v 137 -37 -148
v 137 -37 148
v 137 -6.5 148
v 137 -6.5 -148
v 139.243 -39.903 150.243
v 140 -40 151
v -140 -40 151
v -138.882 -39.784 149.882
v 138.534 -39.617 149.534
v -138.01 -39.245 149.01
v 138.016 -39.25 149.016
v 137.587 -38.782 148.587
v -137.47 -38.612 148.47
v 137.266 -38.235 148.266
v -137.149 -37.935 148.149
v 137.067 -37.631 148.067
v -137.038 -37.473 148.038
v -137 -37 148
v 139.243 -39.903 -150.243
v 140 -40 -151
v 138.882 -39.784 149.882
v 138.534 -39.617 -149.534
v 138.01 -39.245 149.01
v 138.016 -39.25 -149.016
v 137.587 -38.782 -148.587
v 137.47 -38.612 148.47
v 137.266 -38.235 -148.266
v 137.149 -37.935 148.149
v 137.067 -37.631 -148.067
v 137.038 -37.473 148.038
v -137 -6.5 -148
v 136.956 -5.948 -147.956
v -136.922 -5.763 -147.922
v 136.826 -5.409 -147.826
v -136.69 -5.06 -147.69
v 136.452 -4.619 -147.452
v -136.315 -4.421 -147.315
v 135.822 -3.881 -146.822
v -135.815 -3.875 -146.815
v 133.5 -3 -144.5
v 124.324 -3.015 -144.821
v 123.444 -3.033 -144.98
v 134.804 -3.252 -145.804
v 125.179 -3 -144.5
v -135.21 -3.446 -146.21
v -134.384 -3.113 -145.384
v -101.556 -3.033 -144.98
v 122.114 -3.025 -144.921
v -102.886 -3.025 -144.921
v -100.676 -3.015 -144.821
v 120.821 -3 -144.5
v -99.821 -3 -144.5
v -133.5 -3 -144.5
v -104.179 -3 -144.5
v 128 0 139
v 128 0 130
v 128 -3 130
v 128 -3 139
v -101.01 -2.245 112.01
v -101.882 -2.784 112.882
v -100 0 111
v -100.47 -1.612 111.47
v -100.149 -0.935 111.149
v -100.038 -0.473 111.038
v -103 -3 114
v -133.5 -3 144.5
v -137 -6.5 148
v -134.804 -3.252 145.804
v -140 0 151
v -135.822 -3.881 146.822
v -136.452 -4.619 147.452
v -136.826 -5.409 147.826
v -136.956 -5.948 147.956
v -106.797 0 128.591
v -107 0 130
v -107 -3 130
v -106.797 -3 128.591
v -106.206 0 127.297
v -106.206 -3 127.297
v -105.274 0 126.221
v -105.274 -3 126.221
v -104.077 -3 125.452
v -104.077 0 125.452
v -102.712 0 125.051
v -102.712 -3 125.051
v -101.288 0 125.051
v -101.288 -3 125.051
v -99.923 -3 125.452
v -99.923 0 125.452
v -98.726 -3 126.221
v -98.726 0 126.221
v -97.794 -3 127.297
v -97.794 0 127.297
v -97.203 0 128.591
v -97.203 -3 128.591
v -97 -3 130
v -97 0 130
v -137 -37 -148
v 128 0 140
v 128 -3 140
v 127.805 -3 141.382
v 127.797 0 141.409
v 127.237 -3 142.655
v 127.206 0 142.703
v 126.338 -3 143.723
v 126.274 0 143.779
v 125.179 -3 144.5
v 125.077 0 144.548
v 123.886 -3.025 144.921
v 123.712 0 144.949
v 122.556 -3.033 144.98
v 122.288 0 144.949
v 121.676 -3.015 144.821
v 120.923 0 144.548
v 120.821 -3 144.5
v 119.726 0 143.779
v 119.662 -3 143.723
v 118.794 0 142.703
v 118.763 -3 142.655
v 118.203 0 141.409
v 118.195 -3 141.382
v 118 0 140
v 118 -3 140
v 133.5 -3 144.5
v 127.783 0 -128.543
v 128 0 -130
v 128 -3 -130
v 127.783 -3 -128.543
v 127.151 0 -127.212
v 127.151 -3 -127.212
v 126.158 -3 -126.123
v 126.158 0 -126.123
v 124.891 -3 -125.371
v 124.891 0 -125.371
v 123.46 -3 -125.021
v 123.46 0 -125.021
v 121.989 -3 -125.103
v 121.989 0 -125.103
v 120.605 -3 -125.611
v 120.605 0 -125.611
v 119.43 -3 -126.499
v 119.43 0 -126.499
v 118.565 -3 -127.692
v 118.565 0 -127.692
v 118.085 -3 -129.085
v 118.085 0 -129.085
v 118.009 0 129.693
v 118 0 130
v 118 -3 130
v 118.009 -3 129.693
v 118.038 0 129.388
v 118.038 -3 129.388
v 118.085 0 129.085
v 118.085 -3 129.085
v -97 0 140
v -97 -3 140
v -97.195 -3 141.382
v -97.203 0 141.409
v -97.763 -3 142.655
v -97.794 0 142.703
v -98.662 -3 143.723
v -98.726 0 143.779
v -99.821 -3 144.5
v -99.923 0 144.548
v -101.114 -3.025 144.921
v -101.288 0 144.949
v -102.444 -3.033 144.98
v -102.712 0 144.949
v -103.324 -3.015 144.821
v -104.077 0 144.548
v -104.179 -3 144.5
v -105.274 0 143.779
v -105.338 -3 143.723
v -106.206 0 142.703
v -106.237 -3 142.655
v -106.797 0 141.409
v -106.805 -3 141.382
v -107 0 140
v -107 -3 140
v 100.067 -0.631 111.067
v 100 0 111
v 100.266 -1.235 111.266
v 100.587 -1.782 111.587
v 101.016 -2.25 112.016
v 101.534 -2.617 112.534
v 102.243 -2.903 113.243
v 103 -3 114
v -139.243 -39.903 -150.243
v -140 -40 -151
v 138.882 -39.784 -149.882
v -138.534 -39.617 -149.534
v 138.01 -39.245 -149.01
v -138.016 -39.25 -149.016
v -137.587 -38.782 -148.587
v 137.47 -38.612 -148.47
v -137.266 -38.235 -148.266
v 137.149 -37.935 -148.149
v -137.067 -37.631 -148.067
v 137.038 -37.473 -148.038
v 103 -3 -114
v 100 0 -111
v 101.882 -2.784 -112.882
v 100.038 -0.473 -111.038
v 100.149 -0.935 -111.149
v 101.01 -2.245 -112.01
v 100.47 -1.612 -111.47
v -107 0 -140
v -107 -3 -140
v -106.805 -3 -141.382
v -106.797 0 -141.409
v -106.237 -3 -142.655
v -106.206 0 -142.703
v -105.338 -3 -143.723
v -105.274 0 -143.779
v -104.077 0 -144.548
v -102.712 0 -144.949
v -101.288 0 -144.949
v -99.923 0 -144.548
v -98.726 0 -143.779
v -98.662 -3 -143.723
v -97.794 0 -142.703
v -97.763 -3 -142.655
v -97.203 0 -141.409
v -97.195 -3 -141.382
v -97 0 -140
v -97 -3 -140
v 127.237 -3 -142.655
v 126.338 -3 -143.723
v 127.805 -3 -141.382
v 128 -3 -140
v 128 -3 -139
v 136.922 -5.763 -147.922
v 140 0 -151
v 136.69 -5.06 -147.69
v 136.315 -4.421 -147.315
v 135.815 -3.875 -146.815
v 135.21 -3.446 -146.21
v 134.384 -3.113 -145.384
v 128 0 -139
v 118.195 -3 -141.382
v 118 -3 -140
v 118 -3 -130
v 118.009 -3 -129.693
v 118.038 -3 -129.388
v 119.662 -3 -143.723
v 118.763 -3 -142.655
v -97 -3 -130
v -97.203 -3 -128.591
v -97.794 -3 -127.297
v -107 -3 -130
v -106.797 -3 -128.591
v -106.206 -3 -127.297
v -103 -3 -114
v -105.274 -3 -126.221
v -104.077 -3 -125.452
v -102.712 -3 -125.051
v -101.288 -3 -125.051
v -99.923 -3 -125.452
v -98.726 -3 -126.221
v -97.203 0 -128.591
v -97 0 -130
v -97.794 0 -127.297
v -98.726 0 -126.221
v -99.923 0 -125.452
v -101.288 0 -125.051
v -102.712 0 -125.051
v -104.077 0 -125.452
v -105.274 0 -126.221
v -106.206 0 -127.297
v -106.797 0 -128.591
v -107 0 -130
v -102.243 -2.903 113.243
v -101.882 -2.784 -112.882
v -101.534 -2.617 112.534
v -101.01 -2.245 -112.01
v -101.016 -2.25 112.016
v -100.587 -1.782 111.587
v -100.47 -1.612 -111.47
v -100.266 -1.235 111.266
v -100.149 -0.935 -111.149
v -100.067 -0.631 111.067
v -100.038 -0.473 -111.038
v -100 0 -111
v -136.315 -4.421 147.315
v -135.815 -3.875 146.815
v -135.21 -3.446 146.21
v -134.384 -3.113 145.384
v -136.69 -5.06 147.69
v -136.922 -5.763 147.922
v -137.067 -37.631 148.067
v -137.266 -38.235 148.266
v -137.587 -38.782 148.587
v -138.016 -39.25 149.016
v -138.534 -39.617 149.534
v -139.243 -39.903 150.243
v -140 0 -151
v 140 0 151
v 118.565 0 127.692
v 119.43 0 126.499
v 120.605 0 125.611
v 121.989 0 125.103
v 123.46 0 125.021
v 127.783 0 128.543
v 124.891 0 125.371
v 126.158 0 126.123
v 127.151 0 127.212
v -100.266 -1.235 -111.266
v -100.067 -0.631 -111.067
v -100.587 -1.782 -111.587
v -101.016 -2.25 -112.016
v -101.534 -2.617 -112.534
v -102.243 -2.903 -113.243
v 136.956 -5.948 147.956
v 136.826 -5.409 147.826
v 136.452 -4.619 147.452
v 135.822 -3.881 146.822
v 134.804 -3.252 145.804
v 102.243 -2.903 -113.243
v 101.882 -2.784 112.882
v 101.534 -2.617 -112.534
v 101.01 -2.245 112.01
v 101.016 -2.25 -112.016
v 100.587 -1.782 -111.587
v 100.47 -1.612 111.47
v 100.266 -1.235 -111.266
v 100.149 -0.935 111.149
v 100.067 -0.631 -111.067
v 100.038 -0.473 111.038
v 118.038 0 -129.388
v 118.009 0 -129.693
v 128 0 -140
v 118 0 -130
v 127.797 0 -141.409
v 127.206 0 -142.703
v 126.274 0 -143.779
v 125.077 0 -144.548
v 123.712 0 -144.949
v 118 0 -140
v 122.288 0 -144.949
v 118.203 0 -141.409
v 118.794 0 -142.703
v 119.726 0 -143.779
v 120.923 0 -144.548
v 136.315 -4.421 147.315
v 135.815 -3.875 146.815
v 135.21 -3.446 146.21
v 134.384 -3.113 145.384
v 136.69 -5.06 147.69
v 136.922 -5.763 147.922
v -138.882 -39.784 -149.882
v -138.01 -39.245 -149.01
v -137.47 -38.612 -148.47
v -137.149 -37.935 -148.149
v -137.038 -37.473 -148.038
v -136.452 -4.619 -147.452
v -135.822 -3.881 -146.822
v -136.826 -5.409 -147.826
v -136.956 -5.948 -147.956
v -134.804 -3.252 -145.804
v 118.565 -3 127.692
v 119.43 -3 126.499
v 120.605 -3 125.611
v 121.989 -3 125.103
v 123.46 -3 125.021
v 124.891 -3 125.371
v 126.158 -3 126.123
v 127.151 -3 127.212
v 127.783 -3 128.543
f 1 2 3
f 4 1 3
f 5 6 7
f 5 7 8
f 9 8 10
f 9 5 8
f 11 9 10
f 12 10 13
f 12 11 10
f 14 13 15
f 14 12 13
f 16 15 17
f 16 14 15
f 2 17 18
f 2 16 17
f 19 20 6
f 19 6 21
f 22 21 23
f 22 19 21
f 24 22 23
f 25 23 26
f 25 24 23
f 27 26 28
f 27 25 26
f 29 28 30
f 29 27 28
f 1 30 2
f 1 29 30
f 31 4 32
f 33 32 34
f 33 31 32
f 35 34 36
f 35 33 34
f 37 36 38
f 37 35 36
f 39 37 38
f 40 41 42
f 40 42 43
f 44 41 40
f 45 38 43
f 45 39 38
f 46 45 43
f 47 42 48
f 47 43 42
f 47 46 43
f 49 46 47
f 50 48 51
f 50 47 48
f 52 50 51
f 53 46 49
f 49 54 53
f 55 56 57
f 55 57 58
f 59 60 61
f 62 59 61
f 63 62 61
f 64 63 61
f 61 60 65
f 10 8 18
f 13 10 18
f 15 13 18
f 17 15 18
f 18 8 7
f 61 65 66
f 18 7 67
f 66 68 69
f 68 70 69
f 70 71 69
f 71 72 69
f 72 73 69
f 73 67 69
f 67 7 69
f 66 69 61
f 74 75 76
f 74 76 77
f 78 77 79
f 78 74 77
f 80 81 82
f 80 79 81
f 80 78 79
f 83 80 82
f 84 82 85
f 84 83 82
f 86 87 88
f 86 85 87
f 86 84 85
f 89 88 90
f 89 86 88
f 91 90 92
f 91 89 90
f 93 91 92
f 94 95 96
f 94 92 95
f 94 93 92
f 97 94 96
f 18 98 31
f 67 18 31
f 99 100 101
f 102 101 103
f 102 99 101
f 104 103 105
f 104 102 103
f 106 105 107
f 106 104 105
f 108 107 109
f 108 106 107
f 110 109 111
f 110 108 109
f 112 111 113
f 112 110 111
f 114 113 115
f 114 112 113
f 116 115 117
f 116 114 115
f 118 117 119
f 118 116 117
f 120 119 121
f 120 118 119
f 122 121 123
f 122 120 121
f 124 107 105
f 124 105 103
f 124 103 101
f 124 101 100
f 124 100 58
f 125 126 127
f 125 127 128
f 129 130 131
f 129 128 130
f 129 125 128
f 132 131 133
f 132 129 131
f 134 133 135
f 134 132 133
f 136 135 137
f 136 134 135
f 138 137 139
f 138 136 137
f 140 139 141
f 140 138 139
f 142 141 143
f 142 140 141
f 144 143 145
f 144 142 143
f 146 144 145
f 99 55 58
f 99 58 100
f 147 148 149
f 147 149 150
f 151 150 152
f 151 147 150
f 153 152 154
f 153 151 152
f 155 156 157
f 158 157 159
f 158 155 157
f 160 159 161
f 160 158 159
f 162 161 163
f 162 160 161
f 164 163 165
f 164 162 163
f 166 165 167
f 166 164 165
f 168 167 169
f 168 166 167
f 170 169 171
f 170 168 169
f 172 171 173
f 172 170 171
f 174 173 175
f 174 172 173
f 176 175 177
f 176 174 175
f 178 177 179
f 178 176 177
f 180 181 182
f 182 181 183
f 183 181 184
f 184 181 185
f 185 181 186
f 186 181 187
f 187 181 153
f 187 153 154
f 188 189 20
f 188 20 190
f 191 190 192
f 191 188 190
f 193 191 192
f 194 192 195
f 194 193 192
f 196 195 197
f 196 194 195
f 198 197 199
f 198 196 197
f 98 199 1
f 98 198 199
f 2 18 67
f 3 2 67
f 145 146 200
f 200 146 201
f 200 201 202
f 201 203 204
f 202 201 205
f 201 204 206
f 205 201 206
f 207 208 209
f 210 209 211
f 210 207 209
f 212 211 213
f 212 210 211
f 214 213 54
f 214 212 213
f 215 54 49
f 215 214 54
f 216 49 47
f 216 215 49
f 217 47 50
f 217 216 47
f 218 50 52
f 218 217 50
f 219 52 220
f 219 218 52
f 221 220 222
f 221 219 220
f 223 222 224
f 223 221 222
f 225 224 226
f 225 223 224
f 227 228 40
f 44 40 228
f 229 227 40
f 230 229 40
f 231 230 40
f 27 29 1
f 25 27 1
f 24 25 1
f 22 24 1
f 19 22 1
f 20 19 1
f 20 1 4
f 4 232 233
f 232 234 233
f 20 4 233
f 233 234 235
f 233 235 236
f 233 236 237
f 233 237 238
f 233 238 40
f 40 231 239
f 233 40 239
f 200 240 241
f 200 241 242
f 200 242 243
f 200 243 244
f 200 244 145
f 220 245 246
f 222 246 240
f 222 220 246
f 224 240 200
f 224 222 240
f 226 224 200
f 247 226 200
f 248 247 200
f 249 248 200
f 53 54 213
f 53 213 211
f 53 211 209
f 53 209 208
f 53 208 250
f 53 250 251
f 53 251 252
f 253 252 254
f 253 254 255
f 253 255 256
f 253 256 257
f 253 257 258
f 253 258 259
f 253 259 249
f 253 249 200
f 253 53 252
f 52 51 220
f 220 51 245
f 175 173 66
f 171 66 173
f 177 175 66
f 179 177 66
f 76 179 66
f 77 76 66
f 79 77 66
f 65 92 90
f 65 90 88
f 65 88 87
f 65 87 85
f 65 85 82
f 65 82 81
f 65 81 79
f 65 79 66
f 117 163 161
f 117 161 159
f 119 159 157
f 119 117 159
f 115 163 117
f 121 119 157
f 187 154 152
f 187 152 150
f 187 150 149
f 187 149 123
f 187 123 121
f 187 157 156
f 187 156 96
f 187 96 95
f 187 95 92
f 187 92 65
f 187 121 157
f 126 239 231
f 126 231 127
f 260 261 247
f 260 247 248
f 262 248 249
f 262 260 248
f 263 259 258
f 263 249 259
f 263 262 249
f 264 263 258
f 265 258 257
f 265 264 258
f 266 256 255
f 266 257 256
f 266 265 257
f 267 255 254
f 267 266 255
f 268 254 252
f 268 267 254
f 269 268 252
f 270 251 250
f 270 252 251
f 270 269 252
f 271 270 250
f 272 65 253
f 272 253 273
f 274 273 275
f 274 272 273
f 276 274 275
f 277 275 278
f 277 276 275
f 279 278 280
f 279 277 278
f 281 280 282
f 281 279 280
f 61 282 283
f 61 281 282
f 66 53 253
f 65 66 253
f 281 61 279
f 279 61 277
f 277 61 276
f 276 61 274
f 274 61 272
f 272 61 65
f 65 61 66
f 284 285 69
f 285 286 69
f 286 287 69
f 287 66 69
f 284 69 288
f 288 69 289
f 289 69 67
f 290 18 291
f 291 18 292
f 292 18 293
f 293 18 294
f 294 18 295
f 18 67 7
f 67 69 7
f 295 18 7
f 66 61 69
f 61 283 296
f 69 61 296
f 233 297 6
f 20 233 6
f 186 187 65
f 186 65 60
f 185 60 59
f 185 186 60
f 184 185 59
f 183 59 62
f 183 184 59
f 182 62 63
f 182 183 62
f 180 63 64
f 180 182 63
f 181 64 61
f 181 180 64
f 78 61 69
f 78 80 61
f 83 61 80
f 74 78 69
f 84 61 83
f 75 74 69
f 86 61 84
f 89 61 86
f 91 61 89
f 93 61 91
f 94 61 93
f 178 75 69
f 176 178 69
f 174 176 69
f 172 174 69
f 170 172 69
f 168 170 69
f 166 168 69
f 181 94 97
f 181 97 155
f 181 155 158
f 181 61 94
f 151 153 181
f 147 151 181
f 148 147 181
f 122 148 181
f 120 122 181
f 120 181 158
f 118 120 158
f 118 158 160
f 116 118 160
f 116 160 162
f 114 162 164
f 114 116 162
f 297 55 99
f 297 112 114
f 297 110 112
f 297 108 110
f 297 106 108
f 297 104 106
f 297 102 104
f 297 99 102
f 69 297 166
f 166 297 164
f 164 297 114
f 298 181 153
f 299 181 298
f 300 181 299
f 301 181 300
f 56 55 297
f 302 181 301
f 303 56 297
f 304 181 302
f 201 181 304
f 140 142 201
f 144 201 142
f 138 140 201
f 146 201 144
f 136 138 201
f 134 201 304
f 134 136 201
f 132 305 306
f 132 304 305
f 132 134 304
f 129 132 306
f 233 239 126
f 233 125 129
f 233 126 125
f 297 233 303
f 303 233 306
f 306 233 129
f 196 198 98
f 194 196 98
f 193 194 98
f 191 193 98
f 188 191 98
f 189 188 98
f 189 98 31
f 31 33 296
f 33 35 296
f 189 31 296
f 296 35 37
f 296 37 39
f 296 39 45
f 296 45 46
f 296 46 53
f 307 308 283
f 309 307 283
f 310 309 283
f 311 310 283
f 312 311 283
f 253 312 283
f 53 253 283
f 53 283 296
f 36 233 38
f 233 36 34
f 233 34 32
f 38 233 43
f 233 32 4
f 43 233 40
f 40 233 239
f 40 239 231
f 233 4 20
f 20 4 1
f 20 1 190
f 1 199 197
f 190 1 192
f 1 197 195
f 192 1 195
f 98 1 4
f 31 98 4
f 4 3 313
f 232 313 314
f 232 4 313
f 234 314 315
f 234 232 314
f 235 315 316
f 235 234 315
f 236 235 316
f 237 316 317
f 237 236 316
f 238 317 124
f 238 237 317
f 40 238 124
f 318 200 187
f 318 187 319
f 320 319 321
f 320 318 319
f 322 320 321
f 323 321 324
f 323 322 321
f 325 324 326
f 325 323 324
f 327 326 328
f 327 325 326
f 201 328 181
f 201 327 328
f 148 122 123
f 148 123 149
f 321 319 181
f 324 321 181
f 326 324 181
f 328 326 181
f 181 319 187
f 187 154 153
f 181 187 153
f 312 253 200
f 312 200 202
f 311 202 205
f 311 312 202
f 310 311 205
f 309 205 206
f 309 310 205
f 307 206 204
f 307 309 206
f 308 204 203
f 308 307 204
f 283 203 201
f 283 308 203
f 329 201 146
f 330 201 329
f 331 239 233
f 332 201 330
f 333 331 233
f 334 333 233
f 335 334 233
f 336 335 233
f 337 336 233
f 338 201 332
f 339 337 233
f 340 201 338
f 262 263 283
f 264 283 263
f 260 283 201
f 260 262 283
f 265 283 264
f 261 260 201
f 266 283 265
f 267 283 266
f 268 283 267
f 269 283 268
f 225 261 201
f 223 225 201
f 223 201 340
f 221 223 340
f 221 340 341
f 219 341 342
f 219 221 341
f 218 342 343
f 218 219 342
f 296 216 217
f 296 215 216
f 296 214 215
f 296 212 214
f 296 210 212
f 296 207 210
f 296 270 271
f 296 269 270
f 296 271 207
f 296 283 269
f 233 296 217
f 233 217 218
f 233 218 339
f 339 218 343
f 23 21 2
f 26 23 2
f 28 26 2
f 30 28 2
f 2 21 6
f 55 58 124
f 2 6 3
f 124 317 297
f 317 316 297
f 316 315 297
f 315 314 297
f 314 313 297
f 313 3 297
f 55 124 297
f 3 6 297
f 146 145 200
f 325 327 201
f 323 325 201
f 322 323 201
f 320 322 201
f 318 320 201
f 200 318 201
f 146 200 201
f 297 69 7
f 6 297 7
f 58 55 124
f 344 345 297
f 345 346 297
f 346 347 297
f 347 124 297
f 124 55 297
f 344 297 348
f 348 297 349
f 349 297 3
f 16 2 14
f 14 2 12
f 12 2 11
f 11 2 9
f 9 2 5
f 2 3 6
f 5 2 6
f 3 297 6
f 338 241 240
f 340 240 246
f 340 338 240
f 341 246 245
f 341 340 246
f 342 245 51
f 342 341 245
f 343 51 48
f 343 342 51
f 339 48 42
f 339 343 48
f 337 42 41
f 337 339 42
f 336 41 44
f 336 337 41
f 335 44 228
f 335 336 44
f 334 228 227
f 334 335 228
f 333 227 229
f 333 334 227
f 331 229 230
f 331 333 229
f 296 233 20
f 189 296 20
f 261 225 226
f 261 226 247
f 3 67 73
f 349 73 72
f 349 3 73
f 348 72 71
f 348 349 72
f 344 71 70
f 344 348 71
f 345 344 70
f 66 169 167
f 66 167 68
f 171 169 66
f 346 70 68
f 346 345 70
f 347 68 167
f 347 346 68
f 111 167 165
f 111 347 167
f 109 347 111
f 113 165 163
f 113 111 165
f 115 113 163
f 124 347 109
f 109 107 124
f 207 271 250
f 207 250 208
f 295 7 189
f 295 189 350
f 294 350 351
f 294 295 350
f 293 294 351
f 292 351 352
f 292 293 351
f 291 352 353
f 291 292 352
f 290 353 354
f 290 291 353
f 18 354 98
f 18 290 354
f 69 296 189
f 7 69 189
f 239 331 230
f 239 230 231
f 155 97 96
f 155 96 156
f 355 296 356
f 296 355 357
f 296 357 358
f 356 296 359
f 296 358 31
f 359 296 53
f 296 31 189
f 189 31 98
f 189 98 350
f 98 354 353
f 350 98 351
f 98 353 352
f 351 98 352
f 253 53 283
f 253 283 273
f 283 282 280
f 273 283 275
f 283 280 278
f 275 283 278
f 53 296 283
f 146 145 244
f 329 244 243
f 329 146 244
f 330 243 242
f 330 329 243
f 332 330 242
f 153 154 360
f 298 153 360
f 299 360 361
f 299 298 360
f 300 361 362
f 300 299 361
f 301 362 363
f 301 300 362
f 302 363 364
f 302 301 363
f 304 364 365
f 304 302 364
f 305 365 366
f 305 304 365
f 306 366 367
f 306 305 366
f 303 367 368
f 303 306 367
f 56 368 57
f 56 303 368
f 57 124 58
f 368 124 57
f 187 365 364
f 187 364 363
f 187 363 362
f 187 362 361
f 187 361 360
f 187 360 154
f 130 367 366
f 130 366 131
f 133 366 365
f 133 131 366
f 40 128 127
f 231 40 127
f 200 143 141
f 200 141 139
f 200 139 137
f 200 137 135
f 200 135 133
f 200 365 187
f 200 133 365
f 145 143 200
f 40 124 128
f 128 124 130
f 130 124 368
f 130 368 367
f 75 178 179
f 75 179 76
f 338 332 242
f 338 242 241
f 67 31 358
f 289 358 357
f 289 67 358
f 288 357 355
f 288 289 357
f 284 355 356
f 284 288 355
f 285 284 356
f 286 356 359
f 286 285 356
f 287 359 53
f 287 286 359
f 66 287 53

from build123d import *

# Parameters (mm, degrees)
IRON_V40X40X3_2_DEPTH      = 359.568542495
IRON_V40X40X3_2_DEPTH_BACK = 57.568542495
IRON_V40X40X3_2_2_DEPTH    = 395.13708499
IRON_V40X40X3_2_3_DEPTH    = 417.13708499
IRON_V40X40X3_2_4_DEPTH    = 395.13708499
CUT_EXTRUDE2_START         = 10
CUT_EXTRUDE2_DEPTH         = 20


with BuildPart() as part:
    # Sketch1 → Iron V40X40X3(2) (new, two sides: drawn at the far end of the back side and taken through both)
    with BuildSketch(Plane(origin=(-140, 0, 151), x_dir=(1, 0, 0), z_dir=(0, 0, -1)).offset(-IRON_V40X40X3_2_DEPTH_BACK)):
        with BuildLine():
            Line((0, 0), (0, 40))
            ThreePointArc((0, 40), (2.121320344, 39.121320344), (3, 37))
            Line((3, 37), (3, 6.5))
            ThreePointArc((3, 6.5), (4.025126266, 4.025126266), (6.5, 3))
            Line((6.5, 3), (37, 3))
            ThreePointArc((37, 3), (39.121320344, 2.121320344), (40, 0))
            Line((40, 0), (0, 0))
        make_face()
    extrude(amount=IRON_V40X40X3_2_DEPTH + IRON_V40X40X3_2_DEPTH_BACK)

    # Iron V40X40X3(2) mitre 1
    split(bisect_by=Plane(origin=(-140, 0, 151), x_dir=(0, -1, 0), z_dir=(-0.707106781, 0, -0.707106781)), keep=Keep.TOP)

    # Iron V40X40X3(2) mitre 2
    split(bisect_by=Plane(origin=(-140, 0, -151), x_dir=(0, -1, 0), z_dir=(-0.707106781, 0, 0.707106781)), keep=Keep.TOP)


with BuildPart() as body_2:
    # Sketch1 on segment 2 (carried to segment 2) → Iron V40X40X3_2 2 (new body)
    with BuildSketch(Plane(origin=(-197.568542495, 0, -151), x_dir=(0, 0, 1), z_dir=(1, 0, 0))):
        with BuildLine():
            Line((0, 0), (0, 40))
            ThreePointArc((0, 40), (2.121320344, 39.121320344), (3, 37))
            Line((3, 37), (3, 6.5))
            ThreePointArc((3, 6.5), (4.025126266, 4.025126266), (6.5, 3))
            Line((6.5, 3), (37, 3))
            ThreePointArc((37, 3), (39.121320344, 2.121320344), (40, 0))
            Line((40, 0), (0, 0))
        make_face()
    extrude(amount=IRON_V40X40X3_2_2_DEPTH)

    # Iron V40X40X3_2 2 mitre 1
    split(bisect_by=Plane(origin=(140, 0, -151), x_dir=(0, -1, 0), z_dir=(-0.707106781, 0, -0.707106781)), keep=Keep.TOP)

    # Iron V40X40X3_2 2 mitre 2
    split(bisect_by=Plane(origin=(-140, 0, -151), x_dir=(0, 1, 0), z_dir=(0.707106781, 0, -0.707106781)), keep=Keep.TOP)


with BuildPart() as body_3:
    # Sketch1 on segment 3 (carried to segment 3) → Iron V40X40X3_2 3 (new body)
    with BuildSketch(Plane(origin=(140, 0, -208.568542495), x_dir=(-1, 0, 0), z_dir=(0, 0, 1))):
        with BuildLine():
            Line((0, 0), (0, 40))
            ThreePointArc((0, 40), (2.121320344, 39.121320344), (3, 37))
            Line((3, 37), (3, 6.5))
            ThreePointArc((3, 6.5), (4.025126266, 4.025126266), (6.5, 3))
            Line((6.5, 3), (37, 3))
            ThreePointArc((37, 3), (39.121320344, 2.121320344), (40, 0))
            Line((40, 0), (0, 0))
        make_face()
    extrude(amount=IRON_V40X40X3_2_3_DEPTH)

    # Iron V40X40X3_2 3 mitre 1
    split(bisect_by=Plane(origin=(140, 0, 151), x_dir=(0, 1, 0), z_dir=(0.707106781, 0, -0.707106781)), keep=Keep.TOP)

    # Iron V40X40X3_2 3 mitre 2
    split(bisect_by=Plane(origin=(140, 0, -151), x_dir=(0, 1, 0), z_dir=(0.707106781, 0, 0.707106781)), keep=Keep.TOP)


with BuildPart() as body_4:
    # Sketch1 on segment 4 (carried to segment 4) → Iron V40X40X3_2 4 (new body)
    with BuildSketch(Plane(origin=(197.568542495, 0, 151), x_dir=(0, 0, -1), z_dir=(-1, 0, 0))):
        with BuildLine():
            Line((0, 0), (0, 40))
            ThreePointArc((0, 40), (2.121320344, 39.121320344), (3, 37))
            Line((3, 37), (3, 6.5))
            ThreePointArc((3, 6.5), (4.025126266, 4.025126266), (6.5, 3))
            Line((6.5, 3), (37, 3))
            ThreePointArc((37, 3), (39.121320344, 2.121320344), (40, 0))
            Line((40, 0), (0, 0))
        make_face()
    extrude(amount=IRON_V40X40X3_2_4_DEPTH)

    # Iron V40X40X3_2 4 mitre 1
    split(bisect_by=Plane(origin=(140, 0, 151), x_dir=(0, -1, 0), z_dir=(-0.707106781, 0, 0.707106781)), keep=Keep.TOP)

    # Iron V40X40X3_2 4 mitre 2
    split(bisect_by=Plane(origin=(-140, 0, 151), x_dir=(0, 1, 0), z_dir=(0.707106781, 0, 0.707106781)), keep=Keep.TOP)


with BuildPart() as cut_extrude2_tool:
    # Sketch2 → Cut-Extrude2 (new body)
    with BuildSketch(Plane(origin=(0, 0, 0), x_dir=(1, 0, 0), z_dir=(0, 1, 0)).offset(CUT_EXTRUDE2_START)):
        with BuildLine():
            Line((-97, 140), (-97, 130))
            ThreePointArc((-97, 130), (-102, 125), (-107, 130))
            Line((-107, 130), (-107, 140))
            ThreePointArc((-107, 140), (-102, 145), (-97, 140))
        make_face()
        with BuildLine():
            Line((128, 140), (128, 130))
            ThreePointArc((128, 130), (123, 125), (118, 130))
            Line((118, 130), (118, 140))
            ThreePointArc((118, 140), (123, 145), (128, 140))
        make_face()
        with BuildLine():
            Line((128, -130), (128, -140))
            ThreePointArc((128, -140), (123, -145), (118, -140))
            Line((118, -140), (118, -130))
            ThreePointArc((118, -130), (123, -125), (128, -130))
        make_face()
        with BuildLine():
            Line((-97, -130), (-97, -140))
            ThreePointArc((-97, -140), (-102, -145), (-107, -140))
            Line((-107, -140), (-107, -130))
            ThreePointArc((-107, -130), (-102, -125), (-97, -130))
        make_face()
    extrude(amount=-CUT_EXTRUDE2_DEPTH)


with BuildPart() as body_2_1:
    add(body_2.part)

    # Cut-Extrude2: cut by cut_extrude2_tool
    add(cut_extrude2_tool.part, mode=Mode.SUBTRACT)


with BuildPart() as body_3_1:
    add(body_3.part)

    # Cut-Extrude2: cut by cut_extrude2_tool
    add(cut_extrude2_tool.part, mode=Mode.SUBTRACT)


with BuildPart() as body_4_1:
    add(body_4.part)

    # Cut-Extrude2: cut by cut_extrude2_tool
    add(cut_extrude2_tool.part, mode=Mode.SUBTRACT)


solid = Compound([part.part, body_2_1.part, body_3_1.part, body_4_1.part])
